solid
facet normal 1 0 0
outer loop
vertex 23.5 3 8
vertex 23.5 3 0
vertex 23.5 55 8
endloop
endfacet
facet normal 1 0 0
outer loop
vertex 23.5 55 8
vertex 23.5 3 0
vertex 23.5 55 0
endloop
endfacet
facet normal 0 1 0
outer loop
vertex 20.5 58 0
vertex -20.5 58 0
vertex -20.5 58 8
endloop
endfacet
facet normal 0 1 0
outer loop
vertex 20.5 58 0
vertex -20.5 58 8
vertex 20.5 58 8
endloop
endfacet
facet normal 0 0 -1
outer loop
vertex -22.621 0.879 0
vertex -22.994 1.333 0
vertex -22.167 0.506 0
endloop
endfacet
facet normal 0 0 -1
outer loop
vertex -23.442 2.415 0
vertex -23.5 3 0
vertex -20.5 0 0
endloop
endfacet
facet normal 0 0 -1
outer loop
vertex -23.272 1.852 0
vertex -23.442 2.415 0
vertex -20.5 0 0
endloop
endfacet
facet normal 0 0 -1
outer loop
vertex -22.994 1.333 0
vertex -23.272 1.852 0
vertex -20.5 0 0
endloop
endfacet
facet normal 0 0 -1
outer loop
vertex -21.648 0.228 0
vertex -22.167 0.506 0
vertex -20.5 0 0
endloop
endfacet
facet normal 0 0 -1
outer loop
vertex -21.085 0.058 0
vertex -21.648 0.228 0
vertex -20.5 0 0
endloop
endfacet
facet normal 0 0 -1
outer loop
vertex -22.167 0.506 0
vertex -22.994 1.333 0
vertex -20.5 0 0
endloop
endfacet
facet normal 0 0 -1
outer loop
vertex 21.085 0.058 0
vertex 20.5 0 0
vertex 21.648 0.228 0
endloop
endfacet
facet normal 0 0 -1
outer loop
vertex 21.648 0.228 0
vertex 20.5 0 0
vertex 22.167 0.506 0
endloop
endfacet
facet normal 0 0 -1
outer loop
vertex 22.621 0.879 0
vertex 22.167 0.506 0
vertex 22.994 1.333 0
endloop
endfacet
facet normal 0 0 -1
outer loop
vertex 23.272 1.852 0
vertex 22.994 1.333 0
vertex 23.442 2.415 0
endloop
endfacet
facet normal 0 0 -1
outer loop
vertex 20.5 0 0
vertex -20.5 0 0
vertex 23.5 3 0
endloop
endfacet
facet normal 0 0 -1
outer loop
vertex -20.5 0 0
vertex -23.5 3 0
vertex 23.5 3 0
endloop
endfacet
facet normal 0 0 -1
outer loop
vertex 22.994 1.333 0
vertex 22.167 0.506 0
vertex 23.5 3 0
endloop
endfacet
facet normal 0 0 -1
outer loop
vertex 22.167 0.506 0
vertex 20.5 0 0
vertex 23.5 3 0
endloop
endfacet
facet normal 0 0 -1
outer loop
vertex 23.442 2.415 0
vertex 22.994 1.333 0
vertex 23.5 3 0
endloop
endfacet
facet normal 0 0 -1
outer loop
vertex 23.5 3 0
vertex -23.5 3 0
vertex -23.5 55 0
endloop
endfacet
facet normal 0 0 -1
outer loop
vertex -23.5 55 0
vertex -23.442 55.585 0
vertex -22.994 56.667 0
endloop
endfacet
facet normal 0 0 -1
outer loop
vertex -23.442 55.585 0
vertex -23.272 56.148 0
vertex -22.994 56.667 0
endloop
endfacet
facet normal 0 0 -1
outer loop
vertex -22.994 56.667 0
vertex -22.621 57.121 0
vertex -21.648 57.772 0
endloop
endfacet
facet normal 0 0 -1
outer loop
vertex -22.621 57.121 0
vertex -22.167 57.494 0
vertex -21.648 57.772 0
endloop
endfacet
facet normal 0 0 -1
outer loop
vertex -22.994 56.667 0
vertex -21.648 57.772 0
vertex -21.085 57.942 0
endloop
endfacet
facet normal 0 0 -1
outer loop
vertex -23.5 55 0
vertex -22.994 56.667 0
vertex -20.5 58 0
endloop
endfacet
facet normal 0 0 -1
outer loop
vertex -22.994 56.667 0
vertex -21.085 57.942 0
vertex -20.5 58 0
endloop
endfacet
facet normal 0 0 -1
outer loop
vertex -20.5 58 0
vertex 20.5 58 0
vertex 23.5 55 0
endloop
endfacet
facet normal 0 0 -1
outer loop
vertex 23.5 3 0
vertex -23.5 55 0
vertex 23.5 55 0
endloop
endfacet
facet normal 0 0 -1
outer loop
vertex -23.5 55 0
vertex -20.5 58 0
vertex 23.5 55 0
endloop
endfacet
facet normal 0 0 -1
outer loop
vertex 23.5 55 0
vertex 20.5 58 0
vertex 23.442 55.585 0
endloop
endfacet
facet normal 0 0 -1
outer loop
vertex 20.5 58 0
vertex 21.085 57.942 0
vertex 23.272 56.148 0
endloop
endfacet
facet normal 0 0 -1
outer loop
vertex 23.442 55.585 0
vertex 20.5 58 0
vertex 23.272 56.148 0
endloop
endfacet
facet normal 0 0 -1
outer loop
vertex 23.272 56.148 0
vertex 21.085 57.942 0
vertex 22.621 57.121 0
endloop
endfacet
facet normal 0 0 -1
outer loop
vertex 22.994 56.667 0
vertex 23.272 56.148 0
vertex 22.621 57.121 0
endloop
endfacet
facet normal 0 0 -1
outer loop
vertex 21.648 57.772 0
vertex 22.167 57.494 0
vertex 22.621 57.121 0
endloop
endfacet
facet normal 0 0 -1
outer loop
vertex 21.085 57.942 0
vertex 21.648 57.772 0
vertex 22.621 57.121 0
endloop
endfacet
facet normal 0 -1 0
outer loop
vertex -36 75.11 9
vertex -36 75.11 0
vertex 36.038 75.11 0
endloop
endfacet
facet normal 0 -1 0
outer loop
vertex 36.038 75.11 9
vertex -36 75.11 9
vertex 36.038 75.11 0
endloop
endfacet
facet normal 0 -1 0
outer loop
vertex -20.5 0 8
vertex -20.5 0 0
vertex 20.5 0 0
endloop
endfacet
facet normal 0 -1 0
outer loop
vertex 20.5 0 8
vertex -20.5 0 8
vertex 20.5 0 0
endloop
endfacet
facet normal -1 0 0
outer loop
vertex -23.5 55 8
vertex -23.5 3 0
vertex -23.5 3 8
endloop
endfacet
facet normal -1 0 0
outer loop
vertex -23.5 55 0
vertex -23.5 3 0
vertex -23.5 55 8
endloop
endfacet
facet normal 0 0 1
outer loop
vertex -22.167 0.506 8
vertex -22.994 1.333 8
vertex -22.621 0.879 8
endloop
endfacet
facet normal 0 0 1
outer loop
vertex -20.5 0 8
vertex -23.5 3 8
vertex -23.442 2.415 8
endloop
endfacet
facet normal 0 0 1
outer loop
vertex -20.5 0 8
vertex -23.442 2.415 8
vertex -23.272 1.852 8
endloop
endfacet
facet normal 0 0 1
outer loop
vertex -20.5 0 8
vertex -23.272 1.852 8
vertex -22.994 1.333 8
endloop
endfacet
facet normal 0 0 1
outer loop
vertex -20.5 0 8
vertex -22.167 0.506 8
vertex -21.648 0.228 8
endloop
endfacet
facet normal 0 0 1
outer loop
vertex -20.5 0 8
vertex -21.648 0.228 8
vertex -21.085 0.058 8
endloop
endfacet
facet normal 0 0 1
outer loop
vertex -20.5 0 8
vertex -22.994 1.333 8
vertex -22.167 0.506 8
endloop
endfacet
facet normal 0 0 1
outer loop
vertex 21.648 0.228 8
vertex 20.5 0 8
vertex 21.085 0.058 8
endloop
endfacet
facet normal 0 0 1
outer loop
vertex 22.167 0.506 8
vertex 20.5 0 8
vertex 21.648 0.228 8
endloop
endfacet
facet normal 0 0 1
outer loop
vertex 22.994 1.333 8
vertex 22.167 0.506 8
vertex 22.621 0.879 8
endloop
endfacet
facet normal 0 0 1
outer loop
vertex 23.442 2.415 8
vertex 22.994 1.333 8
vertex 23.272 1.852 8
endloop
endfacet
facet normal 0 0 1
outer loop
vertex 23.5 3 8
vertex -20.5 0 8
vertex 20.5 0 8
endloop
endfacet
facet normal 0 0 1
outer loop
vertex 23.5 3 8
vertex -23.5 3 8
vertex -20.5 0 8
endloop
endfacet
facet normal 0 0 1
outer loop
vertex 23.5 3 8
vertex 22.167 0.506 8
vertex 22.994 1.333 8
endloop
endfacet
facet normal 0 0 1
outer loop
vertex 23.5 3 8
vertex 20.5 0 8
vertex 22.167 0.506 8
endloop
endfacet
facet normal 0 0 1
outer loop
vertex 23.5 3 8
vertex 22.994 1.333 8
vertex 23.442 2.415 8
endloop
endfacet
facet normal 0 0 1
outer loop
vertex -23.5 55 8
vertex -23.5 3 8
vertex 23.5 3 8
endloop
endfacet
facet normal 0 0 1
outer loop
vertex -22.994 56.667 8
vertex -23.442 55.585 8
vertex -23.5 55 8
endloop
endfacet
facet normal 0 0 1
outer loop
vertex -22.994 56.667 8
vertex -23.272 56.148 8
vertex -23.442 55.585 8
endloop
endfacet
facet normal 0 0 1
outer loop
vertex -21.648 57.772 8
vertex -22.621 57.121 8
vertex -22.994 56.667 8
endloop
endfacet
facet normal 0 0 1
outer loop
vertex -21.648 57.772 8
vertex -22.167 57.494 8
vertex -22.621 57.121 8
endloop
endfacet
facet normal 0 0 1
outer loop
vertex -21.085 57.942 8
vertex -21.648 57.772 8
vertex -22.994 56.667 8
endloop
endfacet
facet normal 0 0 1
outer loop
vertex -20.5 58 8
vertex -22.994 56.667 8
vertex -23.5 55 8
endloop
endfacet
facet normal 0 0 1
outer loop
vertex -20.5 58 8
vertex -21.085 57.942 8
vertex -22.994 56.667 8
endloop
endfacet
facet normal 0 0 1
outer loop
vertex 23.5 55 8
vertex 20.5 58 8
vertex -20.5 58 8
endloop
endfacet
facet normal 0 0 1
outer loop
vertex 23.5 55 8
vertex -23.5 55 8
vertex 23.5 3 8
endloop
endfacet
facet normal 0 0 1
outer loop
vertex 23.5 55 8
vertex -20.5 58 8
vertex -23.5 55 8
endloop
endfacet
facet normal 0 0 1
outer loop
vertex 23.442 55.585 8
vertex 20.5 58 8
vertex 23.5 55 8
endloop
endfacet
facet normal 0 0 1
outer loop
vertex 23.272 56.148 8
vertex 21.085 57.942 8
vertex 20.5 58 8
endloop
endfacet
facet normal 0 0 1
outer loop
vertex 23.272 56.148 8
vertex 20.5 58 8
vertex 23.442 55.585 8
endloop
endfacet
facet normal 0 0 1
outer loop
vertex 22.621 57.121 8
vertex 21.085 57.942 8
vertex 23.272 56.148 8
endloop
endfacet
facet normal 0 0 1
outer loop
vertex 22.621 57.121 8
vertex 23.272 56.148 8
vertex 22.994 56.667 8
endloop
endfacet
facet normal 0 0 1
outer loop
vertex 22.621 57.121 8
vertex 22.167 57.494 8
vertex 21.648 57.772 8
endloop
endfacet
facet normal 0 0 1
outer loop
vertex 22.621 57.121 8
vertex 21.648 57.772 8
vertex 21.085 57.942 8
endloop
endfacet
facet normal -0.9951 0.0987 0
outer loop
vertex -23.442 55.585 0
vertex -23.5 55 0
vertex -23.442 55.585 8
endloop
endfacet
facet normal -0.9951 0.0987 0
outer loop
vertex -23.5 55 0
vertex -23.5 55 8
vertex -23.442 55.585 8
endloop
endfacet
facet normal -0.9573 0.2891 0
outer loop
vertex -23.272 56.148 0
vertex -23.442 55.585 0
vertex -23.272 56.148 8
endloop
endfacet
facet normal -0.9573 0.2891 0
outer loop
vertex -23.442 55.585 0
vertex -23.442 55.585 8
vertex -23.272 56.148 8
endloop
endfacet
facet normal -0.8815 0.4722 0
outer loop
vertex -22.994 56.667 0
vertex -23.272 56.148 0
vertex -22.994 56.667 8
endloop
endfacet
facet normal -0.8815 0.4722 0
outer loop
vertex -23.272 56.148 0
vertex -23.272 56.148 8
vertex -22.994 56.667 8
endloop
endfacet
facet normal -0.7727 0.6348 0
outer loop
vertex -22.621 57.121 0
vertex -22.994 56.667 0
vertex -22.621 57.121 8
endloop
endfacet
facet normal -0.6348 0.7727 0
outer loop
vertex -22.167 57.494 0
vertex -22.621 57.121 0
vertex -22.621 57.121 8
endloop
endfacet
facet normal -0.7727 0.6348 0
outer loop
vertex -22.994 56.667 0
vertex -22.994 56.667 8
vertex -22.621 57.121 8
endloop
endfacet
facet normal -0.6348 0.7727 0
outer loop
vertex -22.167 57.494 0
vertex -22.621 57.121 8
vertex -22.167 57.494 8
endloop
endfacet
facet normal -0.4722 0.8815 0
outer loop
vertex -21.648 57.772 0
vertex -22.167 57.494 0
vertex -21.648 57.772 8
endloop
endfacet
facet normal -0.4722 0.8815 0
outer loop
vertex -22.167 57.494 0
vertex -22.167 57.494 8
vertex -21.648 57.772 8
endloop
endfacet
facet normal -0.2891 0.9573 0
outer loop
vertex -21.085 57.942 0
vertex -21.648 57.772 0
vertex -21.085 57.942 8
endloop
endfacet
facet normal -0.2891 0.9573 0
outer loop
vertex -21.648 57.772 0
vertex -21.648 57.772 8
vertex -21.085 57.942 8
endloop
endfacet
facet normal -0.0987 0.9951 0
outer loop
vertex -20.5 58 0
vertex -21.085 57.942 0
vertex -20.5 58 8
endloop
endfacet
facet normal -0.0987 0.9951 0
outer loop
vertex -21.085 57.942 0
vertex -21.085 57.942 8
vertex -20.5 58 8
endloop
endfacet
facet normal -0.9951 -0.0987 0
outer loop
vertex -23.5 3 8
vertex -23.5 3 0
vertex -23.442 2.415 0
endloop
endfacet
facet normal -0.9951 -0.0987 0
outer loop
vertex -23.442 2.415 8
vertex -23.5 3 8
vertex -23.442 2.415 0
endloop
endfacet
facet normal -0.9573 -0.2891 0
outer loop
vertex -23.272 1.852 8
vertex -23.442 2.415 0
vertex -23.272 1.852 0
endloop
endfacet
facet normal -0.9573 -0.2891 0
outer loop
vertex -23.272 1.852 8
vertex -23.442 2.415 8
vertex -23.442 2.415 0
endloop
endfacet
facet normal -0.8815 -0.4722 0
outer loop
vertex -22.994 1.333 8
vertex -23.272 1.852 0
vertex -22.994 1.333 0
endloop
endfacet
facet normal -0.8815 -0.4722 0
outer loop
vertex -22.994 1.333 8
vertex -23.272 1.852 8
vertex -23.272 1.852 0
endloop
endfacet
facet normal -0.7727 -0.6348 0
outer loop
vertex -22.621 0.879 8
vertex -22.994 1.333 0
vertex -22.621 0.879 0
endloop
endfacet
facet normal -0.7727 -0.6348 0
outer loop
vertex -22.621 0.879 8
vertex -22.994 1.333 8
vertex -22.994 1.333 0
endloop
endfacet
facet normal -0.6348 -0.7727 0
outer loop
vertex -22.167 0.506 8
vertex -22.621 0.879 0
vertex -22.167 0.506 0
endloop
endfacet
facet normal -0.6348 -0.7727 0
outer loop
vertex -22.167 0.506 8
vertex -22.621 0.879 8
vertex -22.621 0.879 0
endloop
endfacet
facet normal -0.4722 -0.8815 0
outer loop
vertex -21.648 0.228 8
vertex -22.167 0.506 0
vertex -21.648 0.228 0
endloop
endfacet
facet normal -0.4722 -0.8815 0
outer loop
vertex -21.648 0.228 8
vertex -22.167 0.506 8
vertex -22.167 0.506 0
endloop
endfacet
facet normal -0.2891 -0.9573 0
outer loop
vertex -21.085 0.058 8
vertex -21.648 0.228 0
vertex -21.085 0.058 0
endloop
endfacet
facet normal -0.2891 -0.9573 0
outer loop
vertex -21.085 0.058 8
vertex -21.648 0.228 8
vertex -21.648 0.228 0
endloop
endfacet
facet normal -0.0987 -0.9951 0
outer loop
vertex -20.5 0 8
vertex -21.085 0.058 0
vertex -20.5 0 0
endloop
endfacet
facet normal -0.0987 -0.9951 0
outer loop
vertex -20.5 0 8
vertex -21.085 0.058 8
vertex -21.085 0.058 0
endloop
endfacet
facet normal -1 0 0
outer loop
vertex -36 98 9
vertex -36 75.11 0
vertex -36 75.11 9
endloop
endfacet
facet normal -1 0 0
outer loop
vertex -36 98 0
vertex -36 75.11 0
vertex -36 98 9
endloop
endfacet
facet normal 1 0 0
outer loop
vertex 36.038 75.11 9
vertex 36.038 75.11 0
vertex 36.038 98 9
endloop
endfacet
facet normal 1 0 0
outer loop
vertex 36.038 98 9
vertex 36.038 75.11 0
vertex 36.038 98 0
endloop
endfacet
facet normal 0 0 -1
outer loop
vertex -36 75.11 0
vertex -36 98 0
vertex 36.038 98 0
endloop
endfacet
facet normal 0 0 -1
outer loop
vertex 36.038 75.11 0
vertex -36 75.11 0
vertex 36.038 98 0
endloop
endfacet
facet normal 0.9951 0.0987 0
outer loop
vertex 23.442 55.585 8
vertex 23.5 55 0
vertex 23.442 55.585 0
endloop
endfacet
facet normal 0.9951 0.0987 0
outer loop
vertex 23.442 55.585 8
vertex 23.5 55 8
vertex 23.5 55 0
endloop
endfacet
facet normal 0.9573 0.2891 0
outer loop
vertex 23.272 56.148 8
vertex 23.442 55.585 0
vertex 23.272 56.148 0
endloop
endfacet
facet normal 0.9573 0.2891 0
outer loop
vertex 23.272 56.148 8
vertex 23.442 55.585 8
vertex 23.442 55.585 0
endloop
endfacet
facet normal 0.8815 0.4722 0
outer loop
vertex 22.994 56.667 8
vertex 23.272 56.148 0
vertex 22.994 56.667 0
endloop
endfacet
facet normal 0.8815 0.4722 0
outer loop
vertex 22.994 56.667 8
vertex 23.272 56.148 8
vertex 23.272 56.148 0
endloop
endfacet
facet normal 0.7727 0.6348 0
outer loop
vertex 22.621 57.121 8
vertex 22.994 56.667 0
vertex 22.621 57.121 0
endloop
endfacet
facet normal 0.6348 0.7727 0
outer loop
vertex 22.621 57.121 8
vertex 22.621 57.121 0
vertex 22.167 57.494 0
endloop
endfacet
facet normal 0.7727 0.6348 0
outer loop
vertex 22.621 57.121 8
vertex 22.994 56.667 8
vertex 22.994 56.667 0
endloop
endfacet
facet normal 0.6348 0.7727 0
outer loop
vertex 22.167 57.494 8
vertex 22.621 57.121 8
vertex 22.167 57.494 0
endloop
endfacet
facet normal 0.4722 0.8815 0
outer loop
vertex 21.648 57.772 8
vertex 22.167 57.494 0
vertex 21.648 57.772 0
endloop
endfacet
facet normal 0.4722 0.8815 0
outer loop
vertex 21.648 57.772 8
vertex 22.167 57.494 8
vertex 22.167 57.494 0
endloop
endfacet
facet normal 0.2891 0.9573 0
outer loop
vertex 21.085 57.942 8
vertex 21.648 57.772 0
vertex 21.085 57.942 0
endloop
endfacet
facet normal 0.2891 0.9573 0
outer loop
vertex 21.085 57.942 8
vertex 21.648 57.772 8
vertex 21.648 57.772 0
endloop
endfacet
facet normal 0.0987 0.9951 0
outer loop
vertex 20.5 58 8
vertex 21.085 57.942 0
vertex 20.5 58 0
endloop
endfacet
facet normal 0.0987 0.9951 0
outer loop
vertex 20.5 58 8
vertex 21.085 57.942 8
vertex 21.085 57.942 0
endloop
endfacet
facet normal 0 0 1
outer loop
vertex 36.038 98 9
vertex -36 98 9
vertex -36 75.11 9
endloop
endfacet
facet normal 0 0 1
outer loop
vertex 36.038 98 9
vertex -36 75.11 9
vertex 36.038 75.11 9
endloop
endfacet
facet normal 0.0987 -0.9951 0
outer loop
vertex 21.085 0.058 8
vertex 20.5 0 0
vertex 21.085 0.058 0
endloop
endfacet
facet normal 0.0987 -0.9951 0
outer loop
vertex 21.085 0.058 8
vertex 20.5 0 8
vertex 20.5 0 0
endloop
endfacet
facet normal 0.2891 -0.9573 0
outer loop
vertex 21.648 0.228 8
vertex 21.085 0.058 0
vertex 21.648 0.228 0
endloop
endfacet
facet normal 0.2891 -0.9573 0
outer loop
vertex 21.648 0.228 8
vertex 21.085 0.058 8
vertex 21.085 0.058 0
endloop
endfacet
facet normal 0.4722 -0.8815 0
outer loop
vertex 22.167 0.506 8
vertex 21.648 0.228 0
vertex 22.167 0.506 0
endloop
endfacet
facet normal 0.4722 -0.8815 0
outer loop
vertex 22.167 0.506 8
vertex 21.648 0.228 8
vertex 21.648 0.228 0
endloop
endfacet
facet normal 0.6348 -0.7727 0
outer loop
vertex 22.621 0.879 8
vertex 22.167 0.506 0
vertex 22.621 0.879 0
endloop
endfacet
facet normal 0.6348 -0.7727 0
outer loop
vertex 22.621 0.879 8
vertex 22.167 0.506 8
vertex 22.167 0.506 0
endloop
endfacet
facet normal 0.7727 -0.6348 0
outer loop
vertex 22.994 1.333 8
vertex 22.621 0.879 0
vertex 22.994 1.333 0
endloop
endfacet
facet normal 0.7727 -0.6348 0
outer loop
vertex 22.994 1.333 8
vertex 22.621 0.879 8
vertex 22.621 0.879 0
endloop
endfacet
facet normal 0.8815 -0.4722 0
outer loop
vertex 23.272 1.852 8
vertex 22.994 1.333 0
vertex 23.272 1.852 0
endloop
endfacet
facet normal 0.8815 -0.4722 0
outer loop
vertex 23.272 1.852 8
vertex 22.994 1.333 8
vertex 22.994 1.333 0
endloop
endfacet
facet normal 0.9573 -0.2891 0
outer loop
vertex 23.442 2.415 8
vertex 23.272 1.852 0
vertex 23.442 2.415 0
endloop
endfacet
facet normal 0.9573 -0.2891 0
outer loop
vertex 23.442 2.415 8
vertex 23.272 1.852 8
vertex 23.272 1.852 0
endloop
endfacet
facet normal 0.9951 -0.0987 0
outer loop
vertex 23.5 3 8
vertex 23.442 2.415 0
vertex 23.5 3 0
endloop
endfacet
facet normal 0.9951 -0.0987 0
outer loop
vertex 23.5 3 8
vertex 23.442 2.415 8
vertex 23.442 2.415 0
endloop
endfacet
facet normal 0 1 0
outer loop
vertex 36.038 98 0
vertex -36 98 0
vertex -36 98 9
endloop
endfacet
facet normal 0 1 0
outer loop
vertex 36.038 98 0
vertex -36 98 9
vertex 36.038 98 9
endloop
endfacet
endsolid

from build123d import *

# Parameters (mm, degrees)
F0_W     = 47
F0_H     = 58
F2_DEPTH = 8
F1_W     = 72.037814
F1_H     = 22.89
F3_DEPTH = 9
F4_R     = 3


with BuildPart() as f2:
    # F0 (on Top) → F2 (new body)
    with BuildSketch(Plane.XY):
        with Locations((0, 29)):
            Rectangle(F0_W, F0_H)
    extrude(amount=F2_DEPTH)

    # F4
    f4_edges = [f2.edges().sort_by_distance(p)[0] for p in [
        (-23.5, 58, 4),
        (23.5, 58, 4),
        (23.5, 0, 4),
        (-23.5, 0, 4),
    ]]
    fillet(f4_edges, radius=F4_R)


with BuildPart() as f3:
    # F1 (on Top) → F3 (new body)
    with BuildSketch(Plane.XY):
        with Locations((0.018907, 86.555)):
            Rectangle(F1_W, F1_H)
    extrude(amount=F3_DEPTH)


solid = Compound([f2.part, f3.part])
